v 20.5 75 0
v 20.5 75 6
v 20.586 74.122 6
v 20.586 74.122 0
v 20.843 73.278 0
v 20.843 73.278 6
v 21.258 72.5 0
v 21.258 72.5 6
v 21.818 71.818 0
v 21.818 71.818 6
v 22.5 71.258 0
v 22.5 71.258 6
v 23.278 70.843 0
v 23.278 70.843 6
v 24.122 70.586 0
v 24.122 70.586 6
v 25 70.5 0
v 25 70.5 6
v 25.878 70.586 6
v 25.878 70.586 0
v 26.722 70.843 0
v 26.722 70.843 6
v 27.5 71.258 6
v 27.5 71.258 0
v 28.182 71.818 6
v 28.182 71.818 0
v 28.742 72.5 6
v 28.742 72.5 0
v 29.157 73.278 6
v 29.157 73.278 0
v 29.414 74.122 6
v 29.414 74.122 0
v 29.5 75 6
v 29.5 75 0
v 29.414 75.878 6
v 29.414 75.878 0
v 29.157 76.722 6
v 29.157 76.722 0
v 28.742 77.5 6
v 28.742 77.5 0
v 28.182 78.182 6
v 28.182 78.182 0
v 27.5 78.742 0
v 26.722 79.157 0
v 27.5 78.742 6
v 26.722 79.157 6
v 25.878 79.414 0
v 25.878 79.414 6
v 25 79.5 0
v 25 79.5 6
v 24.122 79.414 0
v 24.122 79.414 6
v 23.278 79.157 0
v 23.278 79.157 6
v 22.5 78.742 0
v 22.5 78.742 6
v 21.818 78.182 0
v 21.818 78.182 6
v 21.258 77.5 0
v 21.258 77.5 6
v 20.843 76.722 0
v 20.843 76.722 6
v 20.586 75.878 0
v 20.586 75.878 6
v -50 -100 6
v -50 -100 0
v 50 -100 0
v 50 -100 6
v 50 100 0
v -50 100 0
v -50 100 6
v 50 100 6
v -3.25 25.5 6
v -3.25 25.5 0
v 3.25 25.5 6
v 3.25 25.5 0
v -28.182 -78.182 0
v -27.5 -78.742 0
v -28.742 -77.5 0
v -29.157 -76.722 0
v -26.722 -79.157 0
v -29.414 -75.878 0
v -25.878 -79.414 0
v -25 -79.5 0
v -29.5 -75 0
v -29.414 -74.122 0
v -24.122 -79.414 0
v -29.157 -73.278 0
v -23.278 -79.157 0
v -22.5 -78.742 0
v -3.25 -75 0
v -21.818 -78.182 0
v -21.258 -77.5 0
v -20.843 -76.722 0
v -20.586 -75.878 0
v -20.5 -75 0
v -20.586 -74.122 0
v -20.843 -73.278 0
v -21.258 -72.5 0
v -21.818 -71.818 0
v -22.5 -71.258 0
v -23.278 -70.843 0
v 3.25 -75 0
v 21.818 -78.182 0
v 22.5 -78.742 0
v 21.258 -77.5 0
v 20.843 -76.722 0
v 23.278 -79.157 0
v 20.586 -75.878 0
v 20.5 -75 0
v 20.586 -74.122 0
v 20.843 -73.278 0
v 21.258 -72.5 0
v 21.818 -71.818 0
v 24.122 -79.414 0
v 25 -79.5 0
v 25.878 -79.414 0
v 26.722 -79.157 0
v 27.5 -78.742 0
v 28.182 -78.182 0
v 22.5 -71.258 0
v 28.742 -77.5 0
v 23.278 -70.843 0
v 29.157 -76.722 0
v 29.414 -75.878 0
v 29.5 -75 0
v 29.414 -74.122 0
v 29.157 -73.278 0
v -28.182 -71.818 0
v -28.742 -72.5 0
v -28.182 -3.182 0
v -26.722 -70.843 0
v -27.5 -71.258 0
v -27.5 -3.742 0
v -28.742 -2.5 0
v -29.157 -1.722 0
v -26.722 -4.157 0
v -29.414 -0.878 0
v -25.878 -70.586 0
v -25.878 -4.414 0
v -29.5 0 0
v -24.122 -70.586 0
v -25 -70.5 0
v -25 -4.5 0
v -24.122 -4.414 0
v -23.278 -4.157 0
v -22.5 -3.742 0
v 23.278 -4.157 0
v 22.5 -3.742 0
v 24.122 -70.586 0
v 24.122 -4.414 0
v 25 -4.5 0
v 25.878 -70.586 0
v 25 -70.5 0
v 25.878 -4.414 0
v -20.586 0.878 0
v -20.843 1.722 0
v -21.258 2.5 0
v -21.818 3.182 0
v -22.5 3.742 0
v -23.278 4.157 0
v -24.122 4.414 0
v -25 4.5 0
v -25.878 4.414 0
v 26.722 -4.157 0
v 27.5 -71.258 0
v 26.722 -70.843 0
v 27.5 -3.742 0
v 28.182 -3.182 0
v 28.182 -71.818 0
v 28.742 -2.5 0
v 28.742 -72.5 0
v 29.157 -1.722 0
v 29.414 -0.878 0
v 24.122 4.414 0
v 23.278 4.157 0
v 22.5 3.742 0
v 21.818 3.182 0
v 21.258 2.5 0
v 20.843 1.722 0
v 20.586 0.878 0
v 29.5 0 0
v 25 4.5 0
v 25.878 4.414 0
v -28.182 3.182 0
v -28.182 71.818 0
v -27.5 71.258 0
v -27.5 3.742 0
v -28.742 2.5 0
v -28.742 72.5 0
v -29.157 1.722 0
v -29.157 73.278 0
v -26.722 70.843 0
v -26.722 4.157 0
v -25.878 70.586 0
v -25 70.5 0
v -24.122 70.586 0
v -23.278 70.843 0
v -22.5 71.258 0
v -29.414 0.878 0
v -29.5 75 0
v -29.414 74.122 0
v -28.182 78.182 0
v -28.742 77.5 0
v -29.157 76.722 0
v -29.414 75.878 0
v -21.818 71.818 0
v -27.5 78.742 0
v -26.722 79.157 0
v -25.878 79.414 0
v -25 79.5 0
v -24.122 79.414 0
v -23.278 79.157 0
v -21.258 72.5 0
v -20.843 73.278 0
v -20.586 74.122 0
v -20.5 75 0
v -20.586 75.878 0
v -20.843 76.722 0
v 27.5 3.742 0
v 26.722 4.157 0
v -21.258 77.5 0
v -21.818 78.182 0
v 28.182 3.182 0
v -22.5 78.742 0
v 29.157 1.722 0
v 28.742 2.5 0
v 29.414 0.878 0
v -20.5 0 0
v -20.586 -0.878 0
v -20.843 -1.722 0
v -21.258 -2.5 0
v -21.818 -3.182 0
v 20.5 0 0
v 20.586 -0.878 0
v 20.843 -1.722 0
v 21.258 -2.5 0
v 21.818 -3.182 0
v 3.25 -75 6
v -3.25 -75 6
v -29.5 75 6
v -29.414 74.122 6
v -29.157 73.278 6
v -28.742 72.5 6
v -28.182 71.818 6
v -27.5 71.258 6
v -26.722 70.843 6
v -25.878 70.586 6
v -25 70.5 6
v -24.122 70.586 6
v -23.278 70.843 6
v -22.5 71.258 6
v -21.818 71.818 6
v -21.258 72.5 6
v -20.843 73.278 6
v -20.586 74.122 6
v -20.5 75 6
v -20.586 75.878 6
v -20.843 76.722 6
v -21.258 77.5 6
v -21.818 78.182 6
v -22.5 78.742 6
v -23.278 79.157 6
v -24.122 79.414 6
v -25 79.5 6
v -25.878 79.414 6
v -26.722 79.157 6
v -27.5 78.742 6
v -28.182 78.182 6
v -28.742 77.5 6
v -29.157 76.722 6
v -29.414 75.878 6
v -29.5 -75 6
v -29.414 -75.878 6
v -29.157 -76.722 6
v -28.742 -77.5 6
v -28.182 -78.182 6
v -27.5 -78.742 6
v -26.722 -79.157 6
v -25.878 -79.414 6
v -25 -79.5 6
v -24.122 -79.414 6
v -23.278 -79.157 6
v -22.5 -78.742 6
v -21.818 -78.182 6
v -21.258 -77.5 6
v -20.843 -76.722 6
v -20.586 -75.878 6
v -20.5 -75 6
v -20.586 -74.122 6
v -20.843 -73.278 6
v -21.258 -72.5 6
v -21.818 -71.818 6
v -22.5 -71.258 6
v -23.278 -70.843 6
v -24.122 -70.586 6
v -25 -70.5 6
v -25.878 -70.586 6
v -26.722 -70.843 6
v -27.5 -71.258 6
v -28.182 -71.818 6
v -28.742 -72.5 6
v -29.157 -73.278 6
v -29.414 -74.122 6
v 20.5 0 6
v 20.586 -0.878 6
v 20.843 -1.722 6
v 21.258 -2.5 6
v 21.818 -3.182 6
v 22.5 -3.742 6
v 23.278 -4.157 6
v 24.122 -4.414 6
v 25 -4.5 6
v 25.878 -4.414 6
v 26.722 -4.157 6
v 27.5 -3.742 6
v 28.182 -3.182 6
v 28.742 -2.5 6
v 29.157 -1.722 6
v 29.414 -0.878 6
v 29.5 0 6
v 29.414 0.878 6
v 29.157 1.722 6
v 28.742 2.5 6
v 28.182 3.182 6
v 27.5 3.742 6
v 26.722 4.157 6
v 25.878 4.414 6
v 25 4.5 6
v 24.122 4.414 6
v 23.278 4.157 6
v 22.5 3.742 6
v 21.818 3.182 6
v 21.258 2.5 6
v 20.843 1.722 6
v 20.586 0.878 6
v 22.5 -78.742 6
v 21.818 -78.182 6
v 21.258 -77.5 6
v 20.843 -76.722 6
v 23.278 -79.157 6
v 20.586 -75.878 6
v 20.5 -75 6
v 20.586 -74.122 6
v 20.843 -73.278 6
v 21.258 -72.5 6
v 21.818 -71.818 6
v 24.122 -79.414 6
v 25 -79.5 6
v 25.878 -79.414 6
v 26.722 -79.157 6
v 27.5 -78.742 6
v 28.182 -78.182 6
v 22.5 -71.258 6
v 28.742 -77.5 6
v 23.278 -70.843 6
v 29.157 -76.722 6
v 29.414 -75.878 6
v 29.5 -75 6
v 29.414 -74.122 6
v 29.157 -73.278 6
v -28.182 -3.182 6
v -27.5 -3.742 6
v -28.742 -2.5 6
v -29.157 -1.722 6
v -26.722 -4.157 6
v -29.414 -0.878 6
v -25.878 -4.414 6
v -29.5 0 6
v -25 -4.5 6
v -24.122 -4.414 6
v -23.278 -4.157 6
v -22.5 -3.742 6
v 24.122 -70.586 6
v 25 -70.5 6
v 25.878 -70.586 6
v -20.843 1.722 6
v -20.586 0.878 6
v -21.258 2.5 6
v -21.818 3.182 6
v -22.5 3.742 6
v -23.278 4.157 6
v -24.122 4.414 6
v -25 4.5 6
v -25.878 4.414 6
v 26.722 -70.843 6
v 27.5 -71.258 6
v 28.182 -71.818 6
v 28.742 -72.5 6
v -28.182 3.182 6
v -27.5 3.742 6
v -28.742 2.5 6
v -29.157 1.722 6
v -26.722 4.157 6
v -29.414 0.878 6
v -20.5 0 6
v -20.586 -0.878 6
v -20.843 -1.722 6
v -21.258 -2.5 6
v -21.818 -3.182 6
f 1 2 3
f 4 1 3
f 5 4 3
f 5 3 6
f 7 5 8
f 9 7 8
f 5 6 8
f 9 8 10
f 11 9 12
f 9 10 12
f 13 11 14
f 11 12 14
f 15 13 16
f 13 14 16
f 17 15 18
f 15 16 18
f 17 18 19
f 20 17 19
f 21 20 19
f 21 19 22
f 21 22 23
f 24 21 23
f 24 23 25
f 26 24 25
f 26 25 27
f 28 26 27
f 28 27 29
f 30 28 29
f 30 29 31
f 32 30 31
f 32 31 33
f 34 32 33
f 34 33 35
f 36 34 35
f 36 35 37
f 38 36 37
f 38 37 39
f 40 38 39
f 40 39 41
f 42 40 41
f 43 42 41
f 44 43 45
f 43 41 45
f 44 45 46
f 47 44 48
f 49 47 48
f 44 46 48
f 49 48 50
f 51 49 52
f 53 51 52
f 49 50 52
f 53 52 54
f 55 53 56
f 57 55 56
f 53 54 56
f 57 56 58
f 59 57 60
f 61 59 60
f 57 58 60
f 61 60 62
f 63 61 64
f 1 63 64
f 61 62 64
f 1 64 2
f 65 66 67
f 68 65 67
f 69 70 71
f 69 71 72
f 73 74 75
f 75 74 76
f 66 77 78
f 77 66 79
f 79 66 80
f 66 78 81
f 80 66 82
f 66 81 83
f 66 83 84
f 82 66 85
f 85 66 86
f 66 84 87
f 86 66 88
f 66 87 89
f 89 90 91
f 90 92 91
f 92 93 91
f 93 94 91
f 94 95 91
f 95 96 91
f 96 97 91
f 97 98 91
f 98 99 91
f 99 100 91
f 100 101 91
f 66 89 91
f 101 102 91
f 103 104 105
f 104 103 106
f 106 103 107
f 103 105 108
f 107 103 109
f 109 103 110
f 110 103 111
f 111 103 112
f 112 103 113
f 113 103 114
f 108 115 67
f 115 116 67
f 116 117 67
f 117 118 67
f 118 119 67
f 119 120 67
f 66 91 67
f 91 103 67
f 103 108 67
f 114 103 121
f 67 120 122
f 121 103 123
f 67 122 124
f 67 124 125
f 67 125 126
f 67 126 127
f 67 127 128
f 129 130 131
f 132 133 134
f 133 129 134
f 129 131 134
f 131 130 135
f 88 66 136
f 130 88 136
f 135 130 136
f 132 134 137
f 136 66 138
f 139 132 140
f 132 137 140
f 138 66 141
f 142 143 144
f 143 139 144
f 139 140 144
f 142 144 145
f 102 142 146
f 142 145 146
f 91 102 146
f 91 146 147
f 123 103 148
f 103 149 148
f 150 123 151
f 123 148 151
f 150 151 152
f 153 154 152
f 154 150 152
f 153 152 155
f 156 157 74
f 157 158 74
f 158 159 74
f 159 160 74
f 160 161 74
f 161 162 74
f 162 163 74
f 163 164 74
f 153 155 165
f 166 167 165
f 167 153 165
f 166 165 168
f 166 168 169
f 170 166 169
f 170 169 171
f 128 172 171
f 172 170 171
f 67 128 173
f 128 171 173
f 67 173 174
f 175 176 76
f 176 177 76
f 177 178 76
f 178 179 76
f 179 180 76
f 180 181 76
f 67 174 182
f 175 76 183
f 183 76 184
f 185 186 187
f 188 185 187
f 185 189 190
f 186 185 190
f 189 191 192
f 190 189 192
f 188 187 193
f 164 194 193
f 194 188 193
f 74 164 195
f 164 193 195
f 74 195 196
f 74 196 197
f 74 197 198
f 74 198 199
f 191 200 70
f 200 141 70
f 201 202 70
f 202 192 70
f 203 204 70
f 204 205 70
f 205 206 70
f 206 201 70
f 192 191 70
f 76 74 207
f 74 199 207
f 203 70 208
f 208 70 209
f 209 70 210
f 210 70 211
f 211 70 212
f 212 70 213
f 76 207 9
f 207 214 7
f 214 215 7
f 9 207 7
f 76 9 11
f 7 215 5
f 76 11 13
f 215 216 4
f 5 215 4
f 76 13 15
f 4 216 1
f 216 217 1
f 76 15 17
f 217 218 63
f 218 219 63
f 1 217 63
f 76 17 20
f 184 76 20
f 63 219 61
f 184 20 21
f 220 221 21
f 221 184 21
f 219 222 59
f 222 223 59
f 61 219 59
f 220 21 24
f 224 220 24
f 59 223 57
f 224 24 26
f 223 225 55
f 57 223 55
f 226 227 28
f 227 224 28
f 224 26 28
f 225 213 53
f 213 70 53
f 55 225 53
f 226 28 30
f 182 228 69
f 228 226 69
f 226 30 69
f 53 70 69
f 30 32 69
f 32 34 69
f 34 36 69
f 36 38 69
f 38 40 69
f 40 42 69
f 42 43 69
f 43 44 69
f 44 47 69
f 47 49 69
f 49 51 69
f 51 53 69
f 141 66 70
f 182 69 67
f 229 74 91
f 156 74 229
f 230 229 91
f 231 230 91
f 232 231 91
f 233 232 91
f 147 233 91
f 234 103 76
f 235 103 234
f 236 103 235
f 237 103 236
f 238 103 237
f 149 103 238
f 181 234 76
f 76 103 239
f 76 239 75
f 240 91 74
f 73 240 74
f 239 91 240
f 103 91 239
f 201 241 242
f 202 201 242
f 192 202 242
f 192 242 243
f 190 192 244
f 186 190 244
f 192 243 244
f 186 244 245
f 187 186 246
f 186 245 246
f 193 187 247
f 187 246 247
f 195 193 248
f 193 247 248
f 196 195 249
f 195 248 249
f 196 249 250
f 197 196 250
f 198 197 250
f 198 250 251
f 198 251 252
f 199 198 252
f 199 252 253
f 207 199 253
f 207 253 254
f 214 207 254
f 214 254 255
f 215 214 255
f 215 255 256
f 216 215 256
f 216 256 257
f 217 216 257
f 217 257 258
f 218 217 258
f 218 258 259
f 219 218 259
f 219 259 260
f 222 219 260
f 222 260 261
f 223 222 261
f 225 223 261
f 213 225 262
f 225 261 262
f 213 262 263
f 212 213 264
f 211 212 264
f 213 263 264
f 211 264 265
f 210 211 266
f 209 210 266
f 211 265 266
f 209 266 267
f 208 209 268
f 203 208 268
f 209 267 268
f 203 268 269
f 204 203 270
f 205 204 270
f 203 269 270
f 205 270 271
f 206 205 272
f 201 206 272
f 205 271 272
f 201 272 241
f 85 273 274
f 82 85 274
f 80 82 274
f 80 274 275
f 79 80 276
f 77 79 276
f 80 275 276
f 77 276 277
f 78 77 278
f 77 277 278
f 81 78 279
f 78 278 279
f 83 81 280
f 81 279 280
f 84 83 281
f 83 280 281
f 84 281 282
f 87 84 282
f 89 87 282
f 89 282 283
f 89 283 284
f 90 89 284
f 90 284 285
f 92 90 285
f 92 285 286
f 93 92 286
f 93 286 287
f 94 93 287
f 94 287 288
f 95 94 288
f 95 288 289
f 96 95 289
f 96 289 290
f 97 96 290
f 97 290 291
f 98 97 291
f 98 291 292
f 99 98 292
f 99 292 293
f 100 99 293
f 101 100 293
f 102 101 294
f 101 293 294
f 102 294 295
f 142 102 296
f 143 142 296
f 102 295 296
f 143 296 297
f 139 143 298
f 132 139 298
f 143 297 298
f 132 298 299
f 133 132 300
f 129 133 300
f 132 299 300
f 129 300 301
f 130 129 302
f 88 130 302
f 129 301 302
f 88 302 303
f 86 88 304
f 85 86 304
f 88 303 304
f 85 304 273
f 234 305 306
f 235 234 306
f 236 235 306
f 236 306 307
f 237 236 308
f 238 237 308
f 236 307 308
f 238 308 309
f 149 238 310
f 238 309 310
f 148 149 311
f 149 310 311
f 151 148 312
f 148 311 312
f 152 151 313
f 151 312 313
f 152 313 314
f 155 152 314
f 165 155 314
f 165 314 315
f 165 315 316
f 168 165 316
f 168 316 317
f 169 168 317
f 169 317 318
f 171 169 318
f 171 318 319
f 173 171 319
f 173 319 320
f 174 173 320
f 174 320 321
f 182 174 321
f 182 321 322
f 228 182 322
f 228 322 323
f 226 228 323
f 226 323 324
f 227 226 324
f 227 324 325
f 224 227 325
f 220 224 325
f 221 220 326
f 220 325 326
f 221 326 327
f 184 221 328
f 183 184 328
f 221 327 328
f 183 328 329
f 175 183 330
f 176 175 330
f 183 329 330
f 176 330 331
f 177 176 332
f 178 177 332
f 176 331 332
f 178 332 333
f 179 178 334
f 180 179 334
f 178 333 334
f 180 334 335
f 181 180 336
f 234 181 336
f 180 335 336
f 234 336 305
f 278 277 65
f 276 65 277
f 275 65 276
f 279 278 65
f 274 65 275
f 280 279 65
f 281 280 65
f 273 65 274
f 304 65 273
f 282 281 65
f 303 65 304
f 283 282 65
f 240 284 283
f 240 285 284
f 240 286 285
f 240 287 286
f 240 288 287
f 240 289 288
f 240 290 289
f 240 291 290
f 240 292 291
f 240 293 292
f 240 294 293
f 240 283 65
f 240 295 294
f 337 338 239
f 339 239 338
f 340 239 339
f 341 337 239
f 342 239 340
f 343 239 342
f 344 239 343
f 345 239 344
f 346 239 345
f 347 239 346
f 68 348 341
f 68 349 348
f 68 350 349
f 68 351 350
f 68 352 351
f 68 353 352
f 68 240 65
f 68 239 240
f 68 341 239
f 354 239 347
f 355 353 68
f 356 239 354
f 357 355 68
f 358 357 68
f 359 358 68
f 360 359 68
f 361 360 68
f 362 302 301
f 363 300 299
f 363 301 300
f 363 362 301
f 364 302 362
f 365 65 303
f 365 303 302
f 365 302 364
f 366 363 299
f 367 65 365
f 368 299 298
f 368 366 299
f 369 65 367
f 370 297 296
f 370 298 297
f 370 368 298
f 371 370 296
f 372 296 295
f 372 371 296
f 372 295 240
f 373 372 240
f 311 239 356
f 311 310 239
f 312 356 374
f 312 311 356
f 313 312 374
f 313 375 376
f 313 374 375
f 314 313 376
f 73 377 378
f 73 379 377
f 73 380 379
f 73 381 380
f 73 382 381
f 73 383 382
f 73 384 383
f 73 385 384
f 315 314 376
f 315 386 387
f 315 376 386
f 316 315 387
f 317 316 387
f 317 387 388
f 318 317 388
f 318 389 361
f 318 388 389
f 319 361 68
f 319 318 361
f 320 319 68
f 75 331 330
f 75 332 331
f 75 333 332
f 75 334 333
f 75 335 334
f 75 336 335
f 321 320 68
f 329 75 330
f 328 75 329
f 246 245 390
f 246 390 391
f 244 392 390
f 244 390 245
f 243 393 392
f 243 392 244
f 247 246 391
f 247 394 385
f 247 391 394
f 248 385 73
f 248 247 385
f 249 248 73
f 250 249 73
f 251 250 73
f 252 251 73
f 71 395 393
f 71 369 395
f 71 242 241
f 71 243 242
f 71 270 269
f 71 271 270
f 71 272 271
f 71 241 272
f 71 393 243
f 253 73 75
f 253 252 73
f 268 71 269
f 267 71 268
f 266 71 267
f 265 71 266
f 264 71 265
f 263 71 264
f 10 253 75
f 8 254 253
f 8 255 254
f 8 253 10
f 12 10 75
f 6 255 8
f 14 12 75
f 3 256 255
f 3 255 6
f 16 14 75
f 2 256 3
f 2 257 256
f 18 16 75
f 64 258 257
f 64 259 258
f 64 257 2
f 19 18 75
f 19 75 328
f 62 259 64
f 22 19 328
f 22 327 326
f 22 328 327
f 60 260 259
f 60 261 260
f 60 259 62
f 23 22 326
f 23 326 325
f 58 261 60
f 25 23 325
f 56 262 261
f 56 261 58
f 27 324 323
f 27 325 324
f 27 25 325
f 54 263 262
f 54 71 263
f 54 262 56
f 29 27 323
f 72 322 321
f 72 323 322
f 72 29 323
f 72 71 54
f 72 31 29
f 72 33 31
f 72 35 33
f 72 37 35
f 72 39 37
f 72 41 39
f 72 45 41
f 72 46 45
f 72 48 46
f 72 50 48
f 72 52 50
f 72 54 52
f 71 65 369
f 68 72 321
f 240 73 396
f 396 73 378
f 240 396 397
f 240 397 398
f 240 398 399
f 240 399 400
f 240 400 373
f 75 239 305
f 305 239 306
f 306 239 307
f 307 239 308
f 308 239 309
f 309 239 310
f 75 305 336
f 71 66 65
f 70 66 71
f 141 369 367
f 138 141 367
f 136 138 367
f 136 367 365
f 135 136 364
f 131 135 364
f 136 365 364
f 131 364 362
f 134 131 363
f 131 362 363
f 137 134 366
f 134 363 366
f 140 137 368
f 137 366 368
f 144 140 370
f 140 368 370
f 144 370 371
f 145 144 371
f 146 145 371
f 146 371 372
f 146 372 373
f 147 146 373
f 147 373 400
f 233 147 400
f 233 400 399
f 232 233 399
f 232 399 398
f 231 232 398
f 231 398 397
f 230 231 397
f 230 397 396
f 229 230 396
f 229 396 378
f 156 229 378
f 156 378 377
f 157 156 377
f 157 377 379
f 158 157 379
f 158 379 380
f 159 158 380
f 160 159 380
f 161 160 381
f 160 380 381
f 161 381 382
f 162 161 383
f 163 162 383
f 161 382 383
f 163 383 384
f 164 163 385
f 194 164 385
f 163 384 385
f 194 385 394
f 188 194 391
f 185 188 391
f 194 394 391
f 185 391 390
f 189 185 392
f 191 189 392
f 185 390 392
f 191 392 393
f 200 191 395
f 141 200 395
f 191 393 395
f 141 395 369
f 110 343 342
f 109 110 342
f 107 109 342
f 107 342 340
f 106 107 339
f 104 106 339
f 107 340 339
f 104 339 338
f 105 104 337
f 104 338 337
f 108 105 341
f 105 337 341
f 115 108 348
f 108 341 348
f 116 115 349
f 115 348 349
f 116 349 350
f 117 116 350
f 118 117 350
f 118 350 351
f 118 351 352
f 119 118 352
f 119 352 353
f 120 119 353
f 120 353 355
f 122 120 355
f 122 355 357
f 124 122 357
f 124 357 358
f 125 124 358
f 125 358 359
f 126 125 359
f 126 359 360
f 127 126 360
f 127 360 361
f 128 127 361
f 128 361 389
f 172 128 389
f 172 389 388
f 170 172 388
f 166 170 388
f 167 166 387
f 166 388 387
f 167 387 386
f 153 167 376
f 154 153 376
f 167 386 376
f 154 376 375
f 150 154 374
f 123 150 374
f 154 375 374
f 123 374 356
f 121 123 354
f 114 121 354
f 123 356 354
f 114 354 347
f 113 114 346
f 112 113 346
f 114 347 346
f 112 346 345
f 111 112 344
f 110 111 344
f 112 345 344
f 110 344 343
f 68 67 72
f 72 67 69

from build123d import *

# Parameters (mm, degrees)
F0_W     = 100
F0_H     = 200
F0_W_2   = 6.5
F0_H_2   = 100.5
F1_DEPTH = 6
F2_D     = 9


with BuildPart() as f1:
    # F0 (on Top) → F1 (new body)
    with BuildSketch(Plane.XY):
        Rectangle(F0_W, F0_H)
        with Locations((0, -24.75)):
            Rectangle(F0_W_2, F0_H_2, mode=Mode.SUBTRACT)
    extrude(amount=F1_DEPTH)

    # F2 (through all)
    with Locations(Plane(origin=(0, 0, 0), x_dir=(1, 0, 0), z_dir=(0, 0, -1))):
        with Locations((-25, 75), (25, 75), (-25, 0), (25, 0), (25, -75), (-25, -75)):
            Hole(F2_D / 2)


solid = f1.part
